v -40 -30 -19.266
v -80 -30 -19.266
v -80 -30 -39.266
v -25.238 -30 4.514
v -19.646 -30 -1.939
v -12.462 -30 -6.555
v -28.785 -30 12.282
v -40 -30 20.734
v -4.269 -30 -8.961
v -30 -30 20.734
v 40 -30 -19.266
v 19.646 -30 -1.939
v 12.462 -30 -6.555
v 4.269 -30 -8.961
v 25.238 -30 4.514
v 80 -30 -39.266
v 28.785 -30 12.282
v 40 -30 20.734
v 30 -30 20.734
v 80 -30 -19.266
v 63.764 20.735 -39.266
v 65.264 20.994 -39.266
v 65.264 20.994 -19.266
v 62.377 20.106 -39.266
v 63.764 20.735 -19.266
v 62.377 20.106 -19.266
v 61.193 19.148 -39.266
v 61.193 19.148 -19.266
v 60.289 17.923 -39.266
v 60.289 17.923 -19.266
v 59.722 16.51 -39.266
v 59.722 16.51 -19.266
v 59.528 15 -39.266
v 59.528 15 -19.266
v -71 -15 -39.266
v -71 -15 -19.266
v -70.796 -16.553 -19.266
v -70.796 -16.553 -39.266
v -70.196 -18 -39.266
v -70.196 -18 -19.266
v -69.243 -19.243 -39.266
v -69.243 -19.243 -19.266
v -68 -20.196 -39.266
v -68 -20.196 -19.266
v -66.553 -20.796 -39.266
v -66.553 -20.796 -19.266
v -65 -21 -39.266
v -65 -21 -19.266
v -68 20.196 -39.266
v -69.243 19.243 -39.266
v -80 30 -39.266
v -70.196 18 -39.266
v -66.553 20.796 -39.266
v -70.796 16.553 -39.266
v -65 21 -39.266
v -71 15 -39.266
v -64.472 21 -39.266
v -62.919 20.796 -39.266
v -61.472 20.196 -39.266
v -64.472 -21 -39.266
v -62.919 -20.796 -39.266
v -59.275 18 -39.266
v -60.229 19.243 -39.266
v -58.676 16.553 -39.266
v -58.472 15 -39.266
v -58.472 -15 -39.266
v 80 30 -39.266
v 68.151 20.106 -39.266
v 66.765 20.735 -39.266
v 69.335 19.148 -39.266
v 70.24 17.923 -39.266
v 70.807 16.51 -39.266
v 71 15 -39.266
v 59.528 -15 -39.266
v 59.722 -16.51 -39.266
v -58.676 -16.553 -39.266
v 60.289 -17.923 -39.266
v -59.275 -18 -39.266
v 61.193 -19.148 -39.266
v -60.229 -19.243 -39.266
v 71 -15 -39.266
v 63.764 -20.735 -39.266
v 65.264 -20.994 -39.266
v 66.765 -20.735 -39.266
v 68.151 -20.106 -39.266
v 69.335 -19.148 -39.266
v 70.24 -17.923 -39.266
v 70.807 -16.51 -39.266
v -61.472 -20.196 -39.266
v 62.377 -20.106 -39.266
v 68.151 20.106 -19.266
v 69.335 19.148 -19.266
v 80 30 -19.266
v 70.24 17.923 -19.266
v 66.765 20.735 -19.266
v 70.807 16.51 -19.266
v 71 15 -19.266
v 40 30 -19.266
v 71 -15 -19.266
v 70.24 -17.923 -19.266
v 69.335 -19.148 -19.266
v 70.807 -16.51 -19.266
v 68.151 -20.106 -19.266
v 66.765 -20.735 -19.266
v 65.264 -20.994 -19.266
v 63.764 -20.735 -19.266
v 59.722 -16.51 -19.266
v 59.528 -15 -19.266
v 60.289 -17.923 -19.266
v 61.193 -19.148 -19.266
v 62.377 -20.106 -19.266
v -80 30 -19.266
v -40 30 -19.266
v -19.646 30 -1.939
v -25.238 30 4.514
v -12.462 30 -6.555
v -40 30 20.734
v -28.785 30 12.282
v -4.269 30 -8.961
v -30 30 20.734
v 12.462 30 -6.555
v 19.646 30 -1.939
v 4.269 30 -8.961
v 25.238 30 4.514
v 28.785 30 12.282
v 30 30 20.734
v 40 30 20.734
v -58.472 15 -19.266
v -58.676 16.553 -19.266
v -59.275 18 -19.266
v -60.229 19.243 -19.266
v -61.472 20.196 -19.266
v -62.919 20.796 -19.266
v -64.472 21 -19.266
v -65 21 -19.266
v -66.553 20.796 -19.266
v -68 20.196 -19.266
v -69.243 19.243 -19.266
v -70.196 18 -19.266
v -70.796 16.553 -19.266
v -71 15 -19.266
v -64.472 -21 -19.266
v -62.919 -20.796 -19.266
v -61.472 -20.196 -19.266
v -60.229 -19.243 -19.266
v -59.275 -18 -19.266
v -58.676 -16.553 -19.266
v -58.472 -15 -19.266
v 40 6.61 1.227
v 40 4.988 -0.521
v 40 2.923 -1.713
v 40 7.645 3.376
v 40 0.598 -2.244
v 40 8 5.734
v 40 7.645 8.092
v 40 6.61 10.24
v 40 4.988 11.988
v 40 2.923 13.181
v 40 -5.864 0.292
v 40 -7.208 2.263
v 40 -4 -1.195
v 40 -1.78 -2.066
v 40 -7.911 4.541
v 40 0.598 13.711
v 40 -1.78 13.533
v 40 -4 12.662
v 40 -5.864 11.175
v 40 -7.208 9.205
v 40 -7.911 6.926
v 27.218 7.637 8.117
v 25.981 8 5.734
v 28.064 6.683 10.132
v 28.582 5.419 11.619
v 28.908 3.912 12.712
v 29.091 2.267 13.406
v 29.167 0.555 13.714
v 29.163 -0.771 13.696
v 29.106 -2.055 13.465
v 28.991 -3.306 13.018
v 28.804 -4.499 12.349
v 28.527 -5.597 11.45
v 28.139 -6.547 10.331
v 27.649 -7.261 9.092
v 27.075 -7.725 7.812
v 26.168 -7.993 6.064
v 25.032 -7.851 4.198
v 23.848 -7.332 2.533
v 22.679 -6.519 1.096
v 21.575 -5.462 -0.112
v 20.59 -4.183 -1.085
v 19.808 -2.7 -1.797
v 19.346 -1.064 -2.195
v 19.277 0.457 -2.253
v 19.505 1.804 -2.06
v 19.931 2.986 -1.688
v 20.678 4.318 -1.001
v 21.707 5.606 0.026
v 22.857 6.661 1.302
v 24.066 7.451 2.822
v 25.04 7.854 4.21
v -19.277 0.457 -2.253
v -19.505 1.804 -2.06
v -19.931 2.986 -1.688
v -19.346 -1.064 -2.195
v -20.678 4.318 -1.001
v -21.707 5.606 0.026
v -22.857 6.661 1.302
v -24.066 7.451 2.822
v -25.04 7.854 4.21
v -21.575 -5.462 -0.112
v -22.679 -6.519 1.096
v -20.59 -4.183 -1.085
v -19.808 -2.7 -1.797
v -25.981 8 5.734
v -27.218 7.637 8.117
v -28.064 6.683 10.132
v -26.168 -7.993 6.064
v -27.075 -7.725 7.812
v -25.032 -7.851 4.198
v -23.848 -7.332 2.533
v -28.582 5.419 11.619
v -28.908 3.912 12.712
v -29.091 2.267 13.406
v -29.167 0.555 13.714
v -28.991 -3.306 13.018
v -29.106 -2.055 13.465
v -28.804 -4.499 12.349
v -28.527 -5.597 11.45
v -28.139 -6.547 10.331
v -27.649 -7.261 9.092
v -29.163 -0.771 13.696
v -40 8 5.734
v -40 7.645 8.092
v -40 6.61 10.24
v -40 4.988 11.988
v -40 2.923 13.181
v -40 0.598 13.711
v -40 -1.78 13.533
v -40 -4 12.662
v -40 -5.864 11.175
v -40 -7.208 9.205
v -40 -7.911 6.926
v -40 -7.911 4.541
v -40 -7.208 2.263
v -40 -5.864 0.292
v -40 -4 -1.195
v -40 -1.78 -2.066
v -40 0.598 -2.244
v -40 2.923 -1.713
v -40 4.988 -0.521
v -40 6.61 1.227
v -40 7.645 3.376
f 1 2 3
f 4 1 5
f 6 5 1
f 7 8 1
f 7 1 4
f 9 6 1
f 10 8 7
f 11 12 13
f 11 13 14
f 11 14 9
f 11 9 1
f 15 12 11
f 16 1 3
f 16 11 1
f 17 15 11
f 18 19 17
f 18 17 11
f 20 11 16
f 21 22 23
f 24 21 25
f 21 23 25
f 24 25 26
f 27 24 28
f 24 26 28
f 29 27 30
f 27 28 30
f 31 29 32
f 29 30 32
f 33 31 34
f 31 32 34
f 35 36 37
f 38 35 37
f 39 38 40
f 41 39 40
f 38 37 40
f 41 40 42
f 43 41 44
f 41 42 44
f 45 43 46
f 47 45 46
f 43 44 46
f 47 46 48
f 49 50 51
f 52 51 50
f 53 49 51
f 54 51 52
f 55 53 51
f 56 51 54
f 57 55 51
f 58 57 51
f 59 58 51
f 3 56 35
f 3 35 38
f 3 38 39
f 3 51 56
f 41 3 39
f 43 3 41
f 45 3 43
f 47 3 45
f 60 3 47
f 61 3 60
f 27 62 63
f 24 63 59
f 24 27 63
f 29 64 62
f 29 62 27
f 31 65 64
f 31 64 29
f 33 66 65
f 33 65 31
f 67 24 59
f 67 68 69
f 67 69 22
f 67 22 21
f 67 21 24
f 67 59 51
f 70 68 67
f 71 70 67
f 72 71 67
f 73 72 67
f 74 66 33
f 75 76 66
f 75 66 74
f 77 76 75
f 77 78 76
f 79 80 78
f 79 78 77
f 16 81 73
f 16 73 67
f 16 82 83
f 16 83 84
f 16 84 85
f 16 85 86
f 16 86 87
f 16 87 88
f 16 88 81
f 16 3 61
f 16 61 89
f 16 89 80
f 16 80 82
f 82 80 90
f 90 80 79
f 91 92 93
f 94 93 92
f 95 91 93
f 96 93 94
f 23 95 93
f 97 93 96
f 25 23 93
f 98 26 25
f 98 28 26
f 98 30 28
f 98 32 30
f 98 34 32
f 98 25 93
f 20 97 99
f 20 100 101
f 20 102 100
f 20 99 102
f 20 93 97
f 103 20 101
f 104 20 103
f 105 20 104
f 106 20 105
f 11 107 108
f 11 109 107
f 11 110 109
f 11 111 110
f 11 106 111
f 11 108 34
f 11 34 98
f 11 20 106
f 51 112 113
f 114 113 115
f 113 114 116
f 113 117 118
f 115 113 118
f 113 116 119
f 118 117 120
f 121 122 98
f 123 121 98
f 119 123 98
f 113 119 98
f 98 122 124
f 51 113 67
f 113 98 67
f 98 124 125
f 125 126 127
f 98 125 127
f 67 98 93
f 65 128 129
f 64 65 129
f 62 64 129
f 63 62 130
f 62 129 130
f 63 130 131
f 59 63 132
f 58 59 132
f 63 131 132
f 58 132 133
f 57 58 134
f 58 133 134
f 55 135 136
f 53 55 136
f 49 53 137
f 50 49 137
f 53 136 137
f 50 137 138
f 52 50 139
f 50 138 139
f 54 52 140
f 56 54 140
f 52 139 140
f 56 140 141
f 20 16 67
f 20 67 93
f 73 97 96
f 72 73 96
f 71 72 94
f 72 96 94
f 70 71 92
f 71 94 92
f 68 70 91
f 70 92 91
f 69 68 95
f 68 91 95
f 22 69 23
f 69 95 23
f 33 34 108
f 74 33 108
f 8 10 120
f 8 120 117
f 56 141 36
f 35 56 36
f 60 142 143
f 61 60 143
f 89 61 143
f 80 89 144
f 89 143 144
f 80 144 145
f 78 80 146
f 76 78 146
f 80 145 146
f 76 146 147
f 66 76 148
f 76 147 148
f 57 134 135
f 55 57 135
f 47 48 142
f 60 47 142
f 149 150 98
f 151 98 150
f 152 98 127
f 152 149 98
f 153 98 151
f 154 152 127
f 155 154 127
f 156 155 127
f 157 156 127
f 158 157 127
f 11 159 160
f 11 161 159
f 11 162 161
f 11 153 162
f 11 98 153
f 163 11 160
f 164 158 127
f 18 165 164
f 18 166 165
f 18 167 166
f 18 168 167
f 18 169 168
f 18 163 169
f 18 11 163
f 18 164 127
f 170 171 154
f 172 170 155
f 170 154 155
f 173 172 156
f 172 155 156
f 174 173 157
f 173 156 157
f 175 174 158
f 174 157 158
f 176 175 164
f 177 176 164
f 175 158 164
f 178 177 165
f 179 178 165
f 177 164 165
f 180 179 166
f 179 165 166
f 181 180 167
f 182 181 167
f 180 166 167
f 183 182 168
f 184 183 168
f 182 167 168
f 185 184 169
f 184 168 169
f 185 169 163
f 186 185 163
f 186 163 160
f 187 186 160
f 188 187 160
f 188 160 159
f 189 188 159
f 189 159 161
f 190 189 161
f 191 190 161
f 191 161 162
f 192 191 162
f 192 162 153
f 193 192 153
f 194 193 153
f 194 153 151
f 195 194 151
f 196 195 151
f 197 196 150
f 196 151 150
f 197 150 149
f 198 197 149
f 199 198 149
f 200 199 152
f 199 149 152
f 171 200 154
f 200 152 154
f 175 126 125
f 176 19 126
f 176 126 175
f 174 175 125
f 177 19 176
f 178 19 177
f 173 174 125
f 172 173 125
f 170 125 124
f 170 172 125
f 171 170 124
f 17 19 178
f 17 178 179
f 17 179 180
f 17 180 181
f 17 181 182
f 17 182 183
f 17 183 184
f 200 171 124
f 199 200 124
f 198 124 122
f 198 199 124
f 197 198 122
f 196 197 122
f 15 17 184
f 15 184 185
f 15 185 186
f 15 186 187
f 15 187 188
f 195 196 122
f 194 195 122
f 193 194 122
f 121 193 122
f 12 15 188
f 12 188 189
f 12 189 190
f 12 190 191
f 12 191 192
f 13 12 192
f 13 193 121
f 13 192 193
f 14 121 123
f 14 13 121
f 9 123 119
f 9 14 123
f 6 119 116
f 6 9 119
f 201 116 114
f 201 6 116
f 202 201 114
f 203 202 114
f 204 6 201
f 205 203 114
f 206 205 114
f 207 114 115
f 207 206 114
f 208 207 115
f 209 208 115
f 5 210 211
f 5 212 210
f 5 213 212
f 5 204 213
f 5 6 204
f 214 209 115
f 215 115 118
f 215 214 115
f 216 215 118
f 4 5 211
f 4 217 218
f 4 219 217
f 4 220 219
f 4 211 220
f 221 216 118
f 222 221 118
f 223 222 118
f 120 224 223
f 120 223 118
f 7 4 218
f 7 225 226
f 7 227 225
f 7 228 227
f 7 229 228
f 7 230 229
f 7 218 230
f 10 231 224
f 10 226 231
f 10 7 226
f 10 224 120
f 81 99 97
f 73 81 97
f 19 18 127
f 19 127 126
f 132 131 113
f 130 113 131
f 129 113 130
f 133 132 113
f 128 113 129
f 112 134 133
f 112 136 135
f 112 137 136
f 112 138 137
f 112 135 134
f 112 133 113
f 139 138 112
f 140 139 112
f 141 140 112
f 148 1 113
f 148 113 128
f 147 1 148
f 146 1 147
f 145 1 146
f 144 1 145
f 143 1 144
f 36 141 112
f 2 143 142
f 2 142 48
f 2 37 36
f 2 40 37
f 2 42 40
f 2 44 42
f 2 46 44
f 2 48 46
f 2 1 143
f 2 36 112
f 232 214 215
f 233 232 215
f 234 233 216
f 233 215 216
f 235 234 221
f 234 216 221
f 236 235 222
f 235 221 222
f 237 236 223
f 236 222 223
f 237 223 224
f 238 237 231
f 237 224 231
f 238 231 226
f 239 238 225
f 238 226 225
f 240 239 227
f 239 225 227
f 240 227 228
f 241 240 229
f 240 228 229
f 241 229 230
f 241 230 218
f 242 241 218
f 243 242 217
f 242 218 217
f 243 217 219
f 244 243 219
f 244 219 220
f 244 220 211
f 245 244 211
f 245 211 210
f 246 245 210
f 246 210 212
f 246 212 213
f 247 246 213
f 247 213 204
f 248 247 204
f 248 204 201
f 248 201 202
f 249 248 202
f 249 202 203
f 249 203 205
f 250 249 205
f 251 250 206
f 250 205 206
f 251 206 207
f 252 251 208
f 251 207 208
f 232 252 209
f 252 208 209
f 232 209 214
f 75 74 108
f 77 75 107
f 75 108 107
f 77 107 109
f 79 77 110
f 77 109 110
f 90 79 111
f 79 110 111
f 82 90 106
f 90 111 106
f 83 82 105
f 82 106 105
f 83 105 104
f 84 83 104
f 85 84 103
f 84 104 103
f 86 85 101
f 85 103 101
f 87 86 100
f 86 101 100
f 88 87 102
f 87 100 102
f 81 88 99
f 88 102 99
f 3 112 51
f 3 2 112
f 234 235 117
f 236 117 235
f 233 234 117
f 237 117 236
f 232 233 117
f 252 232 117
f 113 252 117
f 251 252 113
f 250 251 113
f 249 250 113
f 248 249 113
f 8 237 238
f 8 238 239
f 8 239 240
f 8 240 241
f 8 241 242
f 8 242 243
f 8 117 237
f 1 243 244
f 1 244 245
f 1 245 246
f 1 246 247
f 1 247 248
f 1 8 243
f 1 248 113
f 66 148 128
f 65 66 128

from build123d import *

# Parameters (mm, degrees)
F1_DEPTH = 30
F2_R     = 8
F3_DEPTH = 120.001
F5_DEPTH = 20.001
F7_DEPTH = 20.001


with BuildPart() as f1:
    # F0 (on Front) → F1 (new body, symmetric)
    with BuildSketch(Plane.XZ):
        with BuildLine():
            Line((-80, -39.266379), (80, -39.266379))
            Line((80, -39.266379), (80, -19.266379))
            Line((80, -19.266379), (40, -19.266379))
            Line((40, -19.266379), (40, 20.733621))
            Line((40, 20.733621), (30, 20.733621))
            ThreePointArc((30, 20.733621), (0, -9.266379), (-30, 20.733621))
            Line((-30, 20.733621), (-40, 20.733621))
            Line((-40, 20.733621), (-40, -19.266379))
            Line((-40, -19.266379), (-80, -19.266379))
            Line((-80, -19.266379), (-80, -39.266379))
        make_face()
    extrude(amount=F1_DEPTH, both=True)

    # F2 (on face) → F3 (cut, through all)
    with BuildSketch(Plane.YZ.offset(40)):
        with Locations((0, 5.733621)):
            Circle(F2_R)
    extrude(amount=-F3_DEPTH, mode=Mode.SUBTRACT)

    # F4 (on face) → F5 (cut, through all)
    with BuildSketch(Plane.XY.offset(-19.266379)):
        with BuildLine():
            ThreePointArc((-58.471588, 15), (-60.228947, 19.242641), (-64.471588, 21))
            Line((-64.471588, 21), (-65, 21))
            ThreePointArc((-65, 21), (-69.242641, 19.242641), (-71, 15))
            Line((-71, 15), (-71, -15))
            ThreePointArc((-71, -15), (-69.242641, -19.242641), (-65, -21))
            Line((-65, -21), (-64.471588, -21))
            ThreePointArc((-64.471588, -21), (-60.228947, -19.242641), (-58.471588, -15))
            Line((-58.471588, -15), (-58.471588, 15))
        make_face()
    extrude(amount=-F5_DEPTH, mode=Mode.SUBTRACT)

    # F6 (on face) → F7 (cut, through all)
    with BuildSketch(Plane.XY.offset(-19.266379)):
        with BuildLine():
            ThreePointArc((71, 15), (69.335045, 19.148178), (65.264206, 20.99418))
            ThreePointArc((65.264206, 20.99418), (61.193367, 19.148178), (59.528412, 15))
            Line((59.528412, 15), (59.528412, -15))
            ThreePointArc((59.528412, -15), (61.193367, -19.148178), (65.264206, -20.99418))
            ThreePointArc((65.264206, -20.99418), (69.335045, -19.148178), (71, -15))
            Line((71, -15), (71, 15))
        make_face()
    extrude(amount=-F7_DEPTH, mode=Mode.SUBTRACT)


solid = f1.part
